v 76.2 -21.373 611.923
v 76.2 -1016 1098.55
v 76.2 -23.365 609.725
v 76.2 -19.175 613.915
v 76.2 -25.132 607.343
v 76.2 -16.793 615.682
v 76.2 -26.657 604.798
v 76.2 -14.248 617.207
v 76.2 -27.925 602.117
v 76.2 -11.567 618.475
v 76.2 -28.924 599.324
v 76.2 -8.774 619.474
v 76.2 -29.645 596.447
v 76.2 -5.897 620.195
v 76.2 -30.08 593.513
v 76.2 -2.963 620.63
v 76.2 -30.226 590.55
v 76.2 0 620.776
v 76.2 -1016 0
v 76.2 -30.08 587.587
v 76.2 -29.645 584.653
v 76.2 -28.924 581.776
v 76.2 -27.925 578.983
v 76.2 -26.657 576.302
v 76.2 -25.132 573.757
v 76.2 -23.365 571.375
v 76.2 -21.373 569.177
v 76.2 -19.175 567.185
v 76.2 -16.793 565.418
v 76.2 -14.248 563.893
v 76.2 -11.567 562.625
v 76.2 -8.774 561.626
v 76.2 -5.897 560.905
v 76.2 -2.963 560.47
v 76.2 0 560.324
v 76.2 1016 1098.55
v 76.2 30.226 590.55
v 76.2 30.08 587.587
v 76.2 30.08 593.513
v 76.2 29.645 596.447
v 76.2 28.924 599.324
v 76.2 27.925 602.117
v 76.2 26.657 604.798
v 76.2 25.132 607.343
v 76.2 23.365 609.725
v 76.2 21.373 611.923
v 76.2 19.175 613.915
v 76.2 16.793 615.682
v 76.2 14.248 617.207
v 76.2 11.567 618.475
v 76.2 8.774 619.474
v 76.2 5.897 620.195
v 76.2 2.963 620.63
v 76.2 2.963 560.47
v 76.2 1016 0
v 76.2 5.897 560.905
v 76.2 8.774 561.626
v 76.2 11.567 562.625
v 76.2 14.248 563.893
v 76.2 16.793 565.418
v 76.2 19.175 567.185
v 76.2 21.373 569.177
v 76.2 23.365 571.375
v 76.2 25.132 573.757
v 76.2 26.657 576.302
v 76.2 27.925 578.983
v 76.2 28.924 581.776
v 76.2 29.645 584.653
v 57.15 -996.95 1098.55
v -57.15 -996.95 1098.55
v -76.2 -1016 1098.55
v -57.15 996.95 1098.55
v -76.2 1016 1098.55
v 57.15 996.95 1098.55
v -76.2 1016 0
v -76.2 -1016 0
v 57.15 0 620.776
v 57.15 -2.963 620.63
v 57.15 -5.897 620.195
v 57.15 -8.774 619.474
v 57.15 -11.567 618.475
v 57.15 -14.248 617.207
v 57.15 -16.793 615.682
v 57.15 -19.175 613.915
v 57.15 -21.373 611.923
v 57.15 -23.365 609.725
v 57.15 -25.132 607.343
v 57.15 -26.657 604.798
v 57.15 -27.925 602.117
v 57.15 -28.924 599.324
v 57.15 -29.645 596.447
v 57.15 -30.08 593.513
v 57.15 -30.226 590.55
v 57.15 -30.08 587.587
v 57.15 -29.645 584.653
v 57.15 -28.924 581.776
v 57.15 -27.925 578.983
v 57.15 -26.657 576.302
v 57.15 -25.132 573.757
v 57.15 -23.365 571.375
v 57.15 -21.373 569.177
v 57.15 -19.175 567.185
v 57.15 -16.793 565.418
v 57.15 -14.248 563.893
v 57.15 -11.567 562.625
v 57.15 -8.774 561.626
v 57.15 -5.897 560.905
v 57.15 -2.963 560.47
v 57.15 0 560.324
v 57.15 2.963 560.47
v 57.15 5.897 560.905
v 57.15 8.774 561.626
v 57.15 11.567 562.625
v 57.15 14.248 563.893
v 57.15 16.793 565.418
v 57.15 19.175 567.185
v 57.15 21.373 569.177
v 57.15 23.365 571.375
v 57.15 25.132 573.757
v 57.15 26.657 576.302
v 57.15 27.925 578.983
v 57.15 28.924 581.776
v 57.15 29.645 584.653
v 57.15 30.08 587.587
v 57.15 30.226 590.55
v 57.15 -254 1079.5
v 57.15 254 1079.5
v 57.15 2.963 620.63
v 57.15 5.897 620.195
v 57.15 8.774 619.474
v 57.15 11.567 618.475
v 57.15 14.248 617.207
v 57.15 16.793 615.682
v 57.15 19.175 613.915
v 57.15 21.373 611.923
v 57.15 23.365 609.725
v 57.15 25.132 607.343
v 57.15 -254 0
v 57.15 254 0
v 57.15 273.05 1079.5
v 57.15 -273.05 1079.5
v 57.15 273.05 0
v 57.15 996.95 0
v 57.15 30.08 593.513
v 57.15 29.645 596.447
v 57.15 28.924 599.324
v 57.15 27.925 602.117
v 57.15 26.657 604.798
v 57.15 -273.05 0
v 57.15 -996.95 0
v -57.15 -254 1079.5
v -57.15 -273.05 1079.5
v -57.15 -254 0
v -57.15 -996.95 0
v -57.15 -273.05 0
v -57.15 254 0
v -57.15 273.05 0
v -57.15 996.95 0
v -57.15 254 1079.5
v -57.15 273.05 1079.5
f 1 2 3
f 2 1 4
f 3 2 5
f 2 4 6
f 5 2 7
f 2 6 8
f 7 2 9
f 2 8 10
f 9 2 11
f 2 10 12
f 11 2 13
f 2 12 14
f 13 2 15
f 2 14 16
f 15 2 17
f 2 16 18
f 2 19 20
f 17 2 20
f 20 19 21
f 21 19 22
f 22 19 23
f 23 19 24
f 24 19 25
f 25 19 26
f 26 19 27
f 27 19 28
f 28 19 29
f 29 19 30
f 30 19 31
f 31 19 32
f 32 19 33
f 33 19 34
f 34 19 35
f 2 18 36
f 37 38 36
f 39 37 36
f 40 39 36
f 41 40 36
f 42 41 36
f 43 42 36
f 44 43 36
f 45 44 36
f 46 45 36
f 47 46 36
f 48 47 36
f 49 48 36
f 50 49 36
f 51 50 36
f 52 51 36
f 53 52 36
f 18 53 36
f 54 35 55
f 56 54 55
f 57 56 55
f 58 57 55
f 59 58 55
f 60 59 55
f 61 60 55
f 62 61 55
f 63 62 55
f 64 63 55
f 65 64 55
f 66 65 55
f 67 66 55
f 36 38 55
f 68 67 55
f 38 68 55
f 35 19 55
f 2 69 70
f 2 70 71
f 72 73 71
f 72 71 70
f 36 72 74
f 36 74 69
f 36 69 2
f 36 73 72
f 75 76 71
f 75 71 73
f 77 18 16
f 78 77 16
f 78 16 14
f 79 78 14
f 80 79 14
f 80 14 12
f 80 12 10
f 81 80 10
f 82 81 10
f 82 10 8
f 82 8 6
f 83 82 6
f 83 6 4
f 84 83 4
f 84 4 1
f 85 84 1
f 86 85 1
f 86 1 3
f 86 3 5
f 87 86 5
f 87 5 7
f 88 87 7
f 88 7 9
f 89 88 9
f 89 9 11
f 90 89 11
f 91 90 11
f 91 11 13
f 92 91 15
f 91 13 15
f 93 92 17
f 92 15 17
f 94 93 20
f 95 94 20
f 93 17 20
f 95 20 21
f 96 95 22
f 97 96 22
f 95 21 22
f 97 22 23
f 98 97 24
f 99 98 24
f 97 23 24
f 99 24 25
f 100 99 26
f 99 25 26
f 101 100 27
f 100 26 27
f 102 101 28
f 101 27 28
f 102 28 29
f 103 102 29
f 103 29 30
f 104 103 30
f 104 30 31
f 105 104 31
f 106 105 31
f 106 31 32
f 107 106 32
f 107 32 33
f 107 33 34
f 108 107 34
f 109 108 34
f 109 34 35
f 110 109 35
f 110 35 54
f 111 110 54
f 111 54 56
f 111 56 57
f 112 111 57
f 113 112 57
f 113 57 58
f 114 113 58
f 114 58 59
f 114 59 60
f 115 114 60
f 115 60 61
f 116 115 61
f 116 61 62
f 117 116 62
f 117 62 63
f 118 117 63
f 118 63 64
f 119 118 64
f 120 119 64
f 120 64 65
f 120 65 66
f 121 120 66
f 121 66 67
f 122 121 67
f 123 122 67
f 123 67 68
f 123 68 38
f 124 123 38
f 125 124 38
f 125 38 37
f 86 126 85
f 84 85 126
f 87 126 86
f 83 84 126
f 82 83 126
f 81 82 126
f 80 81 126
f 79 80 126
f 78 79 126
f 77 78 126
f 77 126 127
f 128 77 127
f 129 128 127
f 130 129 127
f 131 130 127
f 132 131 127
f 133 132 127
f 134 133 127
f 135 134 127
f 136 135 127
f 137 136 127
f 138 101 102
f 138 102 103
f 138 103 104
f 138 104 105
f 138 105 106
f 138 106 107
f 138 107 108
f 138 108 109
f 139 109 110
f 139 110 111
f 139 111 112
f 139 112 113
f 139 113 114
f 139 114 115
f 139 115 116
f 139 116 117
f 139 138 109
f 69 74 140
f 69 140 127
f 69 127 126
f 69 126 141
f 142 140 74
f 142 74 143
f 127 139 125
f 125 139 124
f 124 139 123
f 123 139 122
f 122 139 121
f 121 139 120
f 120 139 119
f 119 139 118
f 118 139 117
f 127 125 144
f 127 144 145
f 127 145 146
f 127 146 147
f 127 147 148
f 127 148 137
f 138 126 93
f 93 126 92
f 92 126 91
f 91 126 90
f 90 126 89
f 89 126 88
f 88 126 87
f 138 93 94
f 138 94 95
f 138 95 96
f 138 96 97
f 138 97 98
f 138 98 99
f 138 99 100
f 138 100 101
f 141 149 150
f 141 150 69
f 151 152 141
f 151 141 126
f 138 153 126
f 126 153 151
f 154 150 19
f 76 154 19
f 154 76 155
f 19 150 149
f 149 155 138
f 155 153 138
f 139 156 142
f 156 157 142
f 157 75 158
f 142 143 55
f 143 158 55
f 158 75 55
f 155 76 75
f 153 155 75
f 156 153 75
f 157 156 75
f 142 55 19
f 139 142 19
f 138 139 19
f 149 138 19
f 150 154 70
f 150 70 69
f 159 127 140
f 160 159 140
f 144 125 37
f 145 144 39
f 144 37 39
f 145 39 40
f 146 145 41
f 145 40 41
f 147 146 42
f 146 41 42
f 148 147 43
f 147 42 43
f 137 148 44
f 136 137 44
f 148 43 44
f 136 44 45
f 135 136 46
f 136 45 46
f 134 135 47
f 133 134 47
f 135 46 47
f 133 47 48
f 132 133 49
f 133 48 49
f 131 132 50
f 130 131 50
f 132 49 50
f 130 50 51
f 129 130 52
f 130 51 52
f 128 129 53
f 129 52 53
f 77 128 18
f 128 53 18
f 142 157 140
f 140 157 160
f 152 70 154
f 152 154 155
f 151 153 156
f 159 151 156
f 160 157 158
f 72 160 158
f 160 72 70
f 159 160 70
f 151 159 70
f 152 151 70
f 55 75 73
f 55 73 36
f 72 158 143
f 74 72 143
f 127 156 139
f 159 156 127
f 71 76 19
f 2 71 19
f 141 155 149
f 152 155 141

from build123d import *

# Parameters (mm, degrees)
F0_W     = 152.4
F0_H     = 2032
F0_W_2   = 114.3
F0_H_2   = 1993.9
F1_DEPTH = 1098.55
F3_DEPTH = 25.4
F4_W     = 19.05
F4_H     = 1079.5
F5_DEPTH = 114.3


with BuildPart() as f1:
    # F0 (on Top) → F1 (new body)
    with BuildSketch(Plane.XY):
        Rectangle(F0_W, F0_H)
        Rectangle(F0_W_2, F0_H_2, mode=Mode.SUBTRACT)
    extrude(amount=F1_DEPTH)

    # F2 (on face) → F3 (cut)
    with BuildSketch(Plane.YZ.offset(76.2)):
        with BuildLine():
            ThreePointArc((30.226, 590.55), (21.37301, 611.92301), (0, 620.776))
            ThreePointArc((0, 620.776), (-21.37301, 569.17699), (30.226, 590.55))
        make_face()
    extrude(amount=-F3_DEPTH, mode=Mode.SUBTRACT)

    # F4 (on face) → F5 (join)
    with BuildSketch(Plane.YZ.offset(-57.15)):
        with Locations((-263.525, 539.75)):
            Rectangle(F4_W, F4_H)
        with Locations((263.525, 539.75)):
            Rectangle(F4_W, F4_H)
    extrude(amount=F5_DEPTH)


solid = f1.part
